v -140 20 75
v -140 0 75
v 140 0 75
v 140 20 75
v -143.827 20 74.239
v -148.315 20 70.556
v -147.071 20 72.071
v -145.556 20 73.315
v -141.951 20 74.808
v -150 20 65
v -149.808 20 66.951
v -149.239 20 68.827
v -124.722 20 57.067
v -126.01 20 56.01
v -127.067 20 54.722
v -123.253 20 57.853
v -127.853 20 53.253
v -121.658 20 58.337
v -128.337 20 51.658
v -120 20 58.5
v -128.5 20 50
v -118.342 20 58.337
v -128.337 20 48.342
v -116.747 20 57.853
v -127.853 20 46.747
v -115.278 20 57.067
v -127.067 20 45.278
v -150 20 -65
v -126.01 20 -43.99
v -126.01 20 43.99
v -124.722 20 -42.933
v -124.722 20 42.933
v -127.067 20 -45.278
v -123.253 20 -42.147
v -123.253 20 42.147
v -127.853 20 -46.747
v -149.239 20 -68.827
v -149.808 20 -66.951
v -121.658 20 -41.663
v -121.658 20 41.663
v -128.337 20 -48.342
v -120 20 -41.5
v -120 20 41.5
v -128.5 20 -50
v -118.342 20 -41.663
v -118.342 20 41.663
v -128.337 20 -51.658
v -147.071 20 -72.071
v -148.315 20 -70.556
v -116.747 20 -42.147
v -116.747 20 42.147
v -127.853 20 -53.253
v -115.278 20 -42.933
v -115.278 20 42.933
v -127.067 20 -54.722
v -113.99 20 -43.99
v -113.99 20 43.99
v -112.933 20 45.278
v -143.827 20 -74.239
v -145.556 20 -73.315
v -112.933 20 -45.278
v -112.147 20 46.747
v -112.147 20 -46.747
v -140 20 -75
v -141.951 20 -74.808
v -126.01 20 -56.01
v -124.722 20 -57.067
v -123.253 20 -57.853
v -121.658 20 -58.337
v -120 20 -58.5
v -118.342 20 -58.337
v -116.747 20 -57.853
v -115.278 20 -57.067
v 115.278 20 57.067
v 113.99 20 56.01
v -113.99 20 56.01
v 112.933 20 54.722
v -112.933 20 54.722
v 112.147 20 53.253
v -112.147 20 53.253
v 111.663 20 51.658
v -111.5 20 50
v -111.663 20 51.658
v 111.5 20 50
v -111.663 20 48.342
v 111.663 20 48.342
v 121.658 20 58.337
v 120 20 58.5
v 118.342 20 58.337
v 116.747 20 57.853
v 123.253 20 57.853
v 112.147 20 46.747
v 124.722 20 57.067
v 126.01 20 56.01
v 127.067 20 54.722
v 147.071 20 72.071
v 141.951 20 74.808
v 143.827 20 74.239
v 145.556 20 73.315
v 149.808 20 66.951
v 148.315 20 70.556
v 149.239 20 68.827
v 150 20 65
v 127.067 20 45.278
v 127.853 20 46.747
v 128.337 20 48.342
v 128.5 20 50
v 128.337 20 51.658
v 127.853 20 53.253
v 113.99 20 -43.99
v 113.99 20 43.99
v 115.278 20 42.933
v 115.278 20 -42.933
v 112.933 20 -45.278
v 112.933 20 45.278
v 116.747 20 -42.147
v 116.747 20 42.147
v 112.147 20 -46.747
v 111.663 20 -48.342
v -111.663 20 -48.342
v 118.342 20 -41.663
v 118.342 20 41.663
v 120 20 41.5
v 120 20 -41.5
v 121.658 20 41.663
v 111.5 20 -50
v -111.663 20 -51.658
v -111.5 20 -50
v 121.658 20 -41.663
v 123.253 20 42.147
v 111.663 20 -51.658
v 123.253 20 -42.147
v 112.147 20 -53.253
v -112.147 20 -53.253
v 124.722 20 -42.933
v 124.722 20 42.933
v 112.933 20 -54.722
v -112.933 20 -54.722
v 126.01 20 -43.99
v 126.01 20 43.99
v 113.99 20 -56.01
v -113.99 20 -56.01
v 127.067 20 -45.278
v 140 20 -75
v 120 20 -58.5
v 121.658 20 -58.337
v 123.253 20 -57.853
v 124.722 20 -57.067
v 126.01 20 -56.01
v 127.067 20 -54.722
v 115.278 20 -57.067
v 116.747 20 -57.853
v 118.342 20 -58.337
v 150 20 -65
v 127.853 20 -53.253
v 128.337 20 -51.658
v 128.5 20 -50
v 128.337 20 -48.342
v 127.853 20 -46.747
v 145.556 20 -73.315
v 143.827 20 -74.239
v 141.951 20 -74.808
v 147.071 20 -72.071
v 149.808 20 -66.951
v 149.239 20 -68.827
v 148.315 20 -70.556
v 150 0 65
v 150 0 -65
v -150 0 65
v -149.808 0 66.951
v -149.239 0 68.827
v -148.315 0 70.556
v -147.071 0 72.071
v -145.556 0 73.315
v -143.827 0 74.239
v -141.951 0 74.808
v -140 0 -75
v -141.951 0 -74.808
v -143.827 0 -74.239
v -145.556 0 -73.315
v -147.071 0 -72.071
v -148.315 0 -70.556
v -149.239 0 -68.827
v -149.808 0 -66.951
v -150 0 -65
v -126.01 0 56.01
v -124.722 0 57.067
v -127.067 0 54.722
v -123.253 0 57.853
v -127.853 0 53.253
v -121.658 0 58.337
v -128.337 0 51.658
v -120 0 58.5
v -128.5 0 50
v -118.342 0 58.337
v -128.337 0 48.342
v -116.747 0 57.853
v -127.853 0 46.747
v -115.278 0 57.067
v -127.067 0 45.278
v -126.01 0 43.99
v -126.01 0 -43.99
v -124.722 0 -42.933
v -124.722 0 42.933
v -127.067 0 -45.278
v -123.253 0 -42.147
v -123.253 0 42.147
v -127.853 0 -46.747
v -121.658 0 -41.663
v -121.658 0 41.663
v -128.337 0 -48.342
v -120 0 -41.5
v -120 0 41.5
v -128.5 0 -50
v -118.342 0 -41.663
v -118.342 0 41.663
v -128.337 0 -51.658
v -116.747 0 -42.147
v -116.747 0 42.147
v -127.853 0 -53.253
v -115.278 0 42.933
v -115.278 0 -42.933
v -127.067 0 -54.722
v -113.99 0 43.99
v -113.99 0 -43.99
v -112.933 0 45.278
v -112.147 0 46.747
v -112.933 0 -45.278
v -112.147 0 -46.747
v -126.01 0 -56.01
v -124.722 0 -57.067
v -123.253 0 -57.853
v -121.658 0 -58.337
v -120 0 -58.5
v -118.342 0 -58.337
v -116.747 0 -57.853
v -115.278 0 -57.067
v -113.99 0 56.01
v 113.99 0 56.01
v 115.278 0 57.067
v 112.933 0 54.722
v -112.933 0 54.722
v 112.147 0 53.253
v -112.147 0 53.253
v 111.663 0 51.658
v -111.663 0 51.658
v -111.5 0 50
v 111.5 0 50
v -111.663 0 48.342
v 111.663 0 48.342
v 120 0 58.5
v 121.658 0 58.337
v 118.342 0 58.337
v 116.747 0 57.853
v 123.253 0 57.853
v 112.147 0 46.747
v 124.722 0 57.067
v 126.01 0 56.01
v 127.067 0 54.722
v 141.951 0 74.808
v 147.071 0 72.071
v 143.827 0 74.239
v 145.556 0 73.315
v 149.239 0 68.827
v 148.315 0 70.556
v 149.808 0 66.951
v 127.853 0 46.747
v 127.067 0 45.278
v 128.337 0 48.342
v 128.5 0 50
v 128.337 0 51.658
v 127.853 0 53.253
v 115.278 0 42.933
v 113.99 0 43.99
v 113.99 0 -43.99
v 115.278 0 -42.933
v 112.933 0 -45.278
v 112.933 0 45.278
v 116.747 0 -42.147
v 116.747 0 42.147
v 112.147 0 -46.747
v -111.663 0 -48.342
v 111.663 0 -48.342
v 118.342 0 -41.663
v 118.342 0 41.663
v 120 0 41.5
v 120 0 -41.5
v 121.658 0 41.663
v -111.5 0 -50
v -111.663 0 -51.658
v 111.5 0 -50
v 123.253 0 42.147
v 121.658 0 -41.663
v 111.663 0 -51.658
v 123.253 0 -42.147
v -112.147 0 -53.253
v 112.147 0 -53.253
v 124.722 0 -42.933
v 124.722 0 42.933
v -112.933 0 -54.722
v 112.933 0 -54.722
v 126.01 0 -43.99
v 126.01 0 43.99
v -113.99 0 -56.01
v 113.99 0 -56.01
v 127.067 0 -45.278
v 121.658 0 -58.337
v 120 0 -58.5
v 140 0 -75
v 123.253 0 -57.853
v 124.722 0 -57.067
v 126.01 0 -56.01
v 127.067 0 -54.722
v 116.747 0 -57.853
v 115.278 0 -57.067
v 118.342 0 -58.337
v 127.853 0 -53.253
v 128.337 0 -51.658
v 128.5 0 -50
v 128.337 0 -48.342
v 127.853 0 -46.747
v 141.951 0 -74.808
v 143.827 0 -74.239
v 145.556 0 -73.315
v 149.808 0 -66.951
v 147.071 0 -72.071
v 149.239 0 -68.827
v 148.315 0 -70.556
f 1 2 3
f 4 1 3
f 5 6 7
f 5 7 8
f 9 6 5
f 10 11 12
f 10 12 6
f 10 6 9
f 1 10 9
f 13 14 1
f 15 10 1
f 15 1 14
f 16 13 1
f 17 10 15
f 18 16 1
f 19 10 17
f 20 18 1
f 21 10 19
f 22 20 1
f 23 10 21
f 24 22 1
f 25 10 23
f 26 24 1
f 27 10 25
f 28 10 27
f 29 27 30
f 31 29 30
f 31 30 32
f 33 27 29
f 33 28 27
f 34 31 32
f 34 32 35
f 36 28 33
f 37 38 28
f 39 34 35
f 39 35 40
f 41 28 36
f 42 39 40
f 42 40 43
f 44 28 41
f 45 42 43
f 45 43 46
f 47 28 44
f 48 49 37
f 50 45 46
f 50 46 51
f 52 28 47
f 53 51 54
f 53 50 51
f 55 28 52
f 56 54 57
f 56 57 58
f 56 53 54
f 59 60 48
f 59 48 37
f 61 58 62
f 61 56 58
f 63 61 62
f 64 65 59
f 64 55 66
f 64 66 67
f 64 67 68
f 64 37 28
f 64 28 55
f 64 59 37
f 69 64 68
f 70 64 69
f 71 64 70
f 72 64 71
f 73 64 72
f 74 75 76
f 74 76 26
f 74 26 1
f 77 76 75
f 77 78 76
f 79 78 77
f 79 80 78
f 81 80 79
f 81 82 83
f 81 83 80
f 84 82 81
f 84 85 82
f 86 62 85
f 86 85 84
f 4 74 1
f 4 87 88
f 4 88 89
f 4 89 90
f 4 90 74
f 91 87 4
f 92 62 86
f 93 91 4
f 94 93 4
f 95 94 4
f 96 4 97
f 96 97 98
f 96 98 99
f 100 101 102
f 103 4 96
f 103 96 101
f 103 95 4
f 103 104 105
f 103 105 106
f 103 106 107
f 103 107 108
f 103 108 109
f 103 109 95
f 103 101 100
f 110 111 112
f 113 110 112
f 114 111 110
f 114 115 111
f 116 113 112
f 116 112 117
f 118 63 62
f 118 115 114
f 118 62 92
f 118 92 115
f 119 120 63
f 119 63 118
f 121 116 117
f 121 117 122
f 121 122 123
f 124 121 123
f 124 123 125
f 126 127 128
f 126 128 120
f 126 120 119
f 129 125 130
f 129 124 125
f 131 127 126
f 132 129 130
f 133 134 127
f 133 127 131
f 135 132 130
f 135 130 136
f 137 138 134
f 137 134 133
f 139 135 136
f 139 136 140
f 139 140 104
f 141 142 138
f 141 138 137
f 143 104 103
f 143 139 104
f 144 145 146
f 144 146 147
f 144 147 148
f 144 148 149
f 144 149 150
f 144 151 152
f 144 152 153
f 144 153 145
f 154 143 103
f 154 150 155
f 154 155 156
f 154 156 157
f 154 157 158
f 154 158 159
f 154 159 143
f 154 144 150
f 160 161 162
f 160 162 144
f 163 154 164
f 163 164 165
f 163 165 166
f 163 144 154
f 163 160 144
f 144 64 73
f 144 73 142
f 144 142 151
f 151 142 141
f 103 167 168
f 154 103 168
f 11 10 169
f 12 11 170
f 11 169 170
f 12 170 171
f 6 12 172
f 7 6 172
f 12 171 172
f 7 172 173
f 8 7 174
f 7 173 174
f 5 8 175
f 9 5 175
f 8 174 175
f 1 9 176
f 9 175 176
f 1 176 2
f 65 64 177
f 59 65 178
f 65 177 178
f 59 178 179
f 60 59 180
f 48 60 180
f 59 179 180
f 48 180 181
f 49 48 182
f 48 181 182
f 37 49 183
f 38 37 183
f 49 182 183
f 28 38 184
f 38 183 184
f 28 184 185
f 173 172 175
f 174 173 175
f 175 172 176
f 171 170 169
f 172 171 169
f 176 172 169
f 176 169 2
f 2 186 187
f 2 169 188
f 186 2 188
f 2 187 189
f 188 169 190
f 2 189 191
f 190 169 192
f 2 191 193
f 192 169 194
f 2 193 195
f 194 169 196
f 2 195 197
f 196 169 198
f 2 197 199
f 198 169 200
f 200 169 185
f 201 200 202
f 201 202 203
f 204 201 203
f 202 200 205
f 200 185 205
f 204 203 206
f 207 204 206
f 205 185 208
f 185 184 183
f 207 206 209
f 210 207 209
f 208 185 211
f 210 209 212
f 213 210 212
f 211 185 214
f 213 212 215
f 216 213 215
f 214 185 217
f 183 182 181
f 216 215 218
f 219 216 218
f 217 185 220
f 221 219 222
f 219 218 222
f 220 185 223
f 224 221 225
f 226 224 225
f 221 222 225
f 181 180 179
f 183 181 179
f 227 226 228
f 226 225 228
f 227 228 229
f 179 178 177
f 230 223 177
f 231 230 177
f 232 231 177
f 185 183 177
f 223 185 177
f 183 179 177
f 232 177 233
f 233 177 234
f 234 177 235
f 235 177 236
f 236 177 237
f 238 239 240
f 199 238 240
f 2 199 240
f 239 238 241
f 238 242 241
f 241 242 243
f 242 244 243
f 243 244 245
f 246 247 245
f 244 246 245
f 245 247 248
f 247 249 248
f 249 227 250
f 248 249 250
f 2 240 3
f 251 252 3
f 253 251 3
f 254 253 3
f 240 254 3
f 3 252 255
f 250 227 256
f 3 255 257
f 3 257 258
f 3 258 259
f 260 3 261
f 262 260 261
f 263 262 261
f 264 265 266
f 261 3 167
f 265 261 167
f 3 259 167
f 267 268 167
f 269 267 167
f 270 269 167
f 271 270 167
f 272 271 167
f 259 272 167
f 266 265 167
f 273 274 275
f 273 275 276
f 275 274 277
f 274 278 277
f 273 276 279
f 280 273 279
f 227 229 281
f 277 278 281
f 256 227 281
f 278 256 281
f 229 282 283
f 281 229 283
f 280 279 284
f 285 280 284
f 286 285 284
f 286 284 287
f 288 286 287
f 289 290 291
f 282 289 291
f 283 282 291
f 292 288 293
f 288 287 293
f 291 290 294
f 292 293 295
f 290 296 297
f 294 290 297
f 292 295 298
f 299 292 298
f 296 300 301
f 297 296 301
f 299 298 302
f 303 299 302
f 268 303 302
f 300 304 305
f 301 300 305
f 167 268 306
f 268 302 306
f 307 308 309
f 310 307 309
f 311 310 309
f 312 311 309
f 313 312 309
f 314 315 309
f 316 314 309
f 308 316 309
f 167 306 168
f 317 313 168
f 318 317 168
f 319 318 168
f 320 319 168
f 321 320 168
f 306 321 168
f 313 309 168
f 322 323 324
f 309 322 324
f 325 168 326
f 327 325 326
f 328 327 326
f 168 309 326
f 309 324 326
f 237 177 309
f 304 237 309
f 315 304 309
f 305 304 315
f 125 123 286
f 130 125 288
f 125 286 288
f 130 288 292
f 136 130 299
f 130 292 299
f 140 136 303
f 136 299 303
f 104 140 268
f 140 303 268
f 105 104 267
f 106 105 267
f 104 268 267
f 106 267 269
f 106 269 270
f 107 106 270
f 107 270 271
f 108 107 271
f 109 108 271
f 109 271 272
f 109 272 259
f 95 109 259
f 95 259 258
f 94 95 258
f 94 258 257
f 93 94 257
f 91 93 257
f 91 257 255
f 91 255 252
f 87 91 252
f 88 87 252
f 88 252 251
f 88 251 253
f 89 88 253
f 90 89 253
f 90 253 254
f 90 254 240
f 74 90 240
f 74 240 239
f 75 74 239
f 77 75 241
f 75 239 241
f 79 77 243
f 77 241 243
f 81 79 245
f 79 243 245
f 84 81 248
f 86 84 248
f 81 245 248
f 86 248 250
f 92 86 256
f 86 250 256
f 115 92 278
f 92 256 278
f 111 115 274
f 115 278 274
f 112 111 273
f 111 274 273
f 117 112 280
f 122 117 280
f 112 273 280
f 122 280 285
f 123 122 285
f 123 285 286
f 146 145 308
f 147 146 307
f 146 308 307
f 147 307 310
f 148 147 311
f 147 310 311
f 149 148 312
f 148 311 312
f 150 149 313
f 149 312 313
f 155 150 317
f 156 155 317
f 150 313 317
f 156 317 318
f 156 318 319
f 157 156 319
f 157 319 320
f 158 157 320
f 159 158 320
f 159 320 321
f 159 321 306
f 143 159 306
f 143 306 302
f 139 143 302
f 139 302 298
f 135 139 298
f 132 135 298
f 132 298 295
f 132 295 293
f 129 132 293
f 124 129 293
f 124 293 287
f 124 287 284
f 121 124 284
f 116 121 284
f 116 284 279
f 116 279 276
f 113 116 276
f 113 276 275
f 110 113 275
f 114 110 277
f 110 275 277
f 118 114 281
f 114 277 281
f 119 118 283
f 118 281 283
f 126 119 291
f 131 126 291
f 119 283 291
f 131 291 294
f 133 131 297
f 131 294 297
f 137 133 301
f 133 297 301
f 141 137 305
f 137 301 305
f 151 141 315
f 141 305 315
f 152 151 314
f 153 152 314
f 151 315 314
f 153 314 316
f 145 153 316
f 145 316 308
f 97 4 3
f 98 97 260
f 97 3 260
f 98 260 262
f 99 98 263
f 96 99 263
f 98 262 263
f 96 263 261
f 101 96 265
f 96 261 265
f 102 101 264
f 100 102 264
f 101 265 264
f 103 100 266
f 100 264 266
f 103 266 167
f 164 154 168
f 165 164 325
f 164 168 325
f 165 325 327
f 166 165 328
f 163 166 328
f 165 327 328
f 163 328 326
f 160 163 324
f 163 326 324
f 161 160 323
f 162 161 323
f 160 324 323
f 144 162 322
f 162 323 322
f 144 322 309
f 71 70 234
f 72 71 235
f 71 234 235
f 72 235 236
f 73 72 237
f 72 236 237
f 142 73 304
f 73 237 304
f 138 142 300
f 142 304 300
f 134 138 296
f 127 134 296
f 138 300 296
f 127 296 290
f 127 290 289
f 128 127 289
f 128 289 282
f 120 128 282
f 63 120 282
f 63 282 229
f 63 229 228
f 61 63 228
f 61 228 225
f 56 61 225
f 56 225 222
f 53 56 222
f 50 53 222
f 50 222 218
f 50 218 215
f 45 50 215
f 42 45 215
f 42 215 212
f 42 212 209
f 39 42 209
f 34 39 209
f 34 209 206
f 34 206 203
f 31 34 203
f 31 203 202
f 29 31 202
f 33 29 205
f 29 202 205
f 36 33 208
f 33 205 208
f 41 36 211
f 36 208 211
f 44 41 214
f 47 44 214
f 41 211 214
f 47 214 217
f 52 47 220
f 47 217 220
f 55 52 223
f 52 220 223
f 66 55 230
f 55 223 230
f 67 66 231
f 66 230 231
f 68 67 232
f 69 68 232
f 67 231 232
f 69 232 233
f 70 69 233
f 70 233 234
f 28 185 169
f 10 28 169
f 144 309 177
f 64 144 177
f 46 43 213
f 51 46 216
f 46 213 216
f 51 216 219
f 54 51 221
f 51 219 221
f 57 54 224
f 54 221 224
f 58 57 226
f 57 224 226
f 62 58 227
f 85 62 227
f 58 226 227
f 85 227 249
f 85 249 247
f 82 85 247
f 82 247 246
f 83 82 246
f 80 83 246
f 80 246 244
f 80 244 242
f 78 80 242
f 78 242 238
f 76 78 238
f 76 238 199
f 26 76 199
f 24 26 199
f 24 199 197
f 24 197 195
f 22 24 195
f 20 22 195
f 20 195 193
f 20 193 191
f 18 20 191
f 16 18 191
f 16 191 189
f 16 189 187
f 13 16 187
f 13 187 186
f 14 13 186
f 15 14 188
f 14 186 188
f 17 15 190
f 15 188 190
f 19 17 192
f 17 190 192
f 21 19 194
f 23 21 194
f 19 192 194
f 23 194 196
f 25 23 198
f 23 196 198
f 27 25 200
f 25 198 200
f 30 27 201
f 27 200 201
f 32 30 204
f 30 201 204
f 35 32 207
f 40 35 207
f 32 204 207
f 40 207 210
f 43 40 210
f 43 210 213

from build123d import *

# Parameters (mm, degrees)
SALIENTE_EXTRUIR2_DEPTH             = 20
DI_METRO_DE_TALADRO_17_0_17_1_D     = 17
DI_METRO_DE_TALADRO_17_0_17_1_DEPTH = 20


with BuildPart() as part:
    # Croquis1 → Saliente-Extruir2 (new body)
    with BuildSketch(Plane(origin=(0, 0, 0), x_dir=(1, 0, 0), z_dir=(0, 1, 0))):
        with BuildLine():
            Line((140, 75), (-140, 75))
            ThreePointArc((-140, 75), (-147.071067812, 72.071067812), (-150, 65))
            Line((-150, 65), (-150, -65))
            ThreePointArc((-150, -65), (-147.071067812, -72.071067812), (-140, -75))
            Line((-140, -75), (140, -75))
            ThreePointArc((140, -75), (147.071067812, -72.071067812), (150, -65))
            Line((150, -65), (150, 65))
            ThreePointArc((150, 65), (147.071067812, 72.071067812), (140, 75))
        make_face()
    extrude(amount=SALIENTE_EXTRUIR2_DEPTH)

    # Diámetro de taladro Ø17.0 (17)1
    with Locations(Plane(origin=(-120, 20, -50), x_dir=(0, 0, 1), z_dir=(0, 1, 0))):
        with Locations((0, 0), (100, 0), (100, 240), (0, 240)):
            Hole(DI_METRO_DE_TALADRO_17_0_17_1_D / 2, depth=DI_METRO_DE_TALADRO_17_0_17_1_DEPTH)


solid = part.part
